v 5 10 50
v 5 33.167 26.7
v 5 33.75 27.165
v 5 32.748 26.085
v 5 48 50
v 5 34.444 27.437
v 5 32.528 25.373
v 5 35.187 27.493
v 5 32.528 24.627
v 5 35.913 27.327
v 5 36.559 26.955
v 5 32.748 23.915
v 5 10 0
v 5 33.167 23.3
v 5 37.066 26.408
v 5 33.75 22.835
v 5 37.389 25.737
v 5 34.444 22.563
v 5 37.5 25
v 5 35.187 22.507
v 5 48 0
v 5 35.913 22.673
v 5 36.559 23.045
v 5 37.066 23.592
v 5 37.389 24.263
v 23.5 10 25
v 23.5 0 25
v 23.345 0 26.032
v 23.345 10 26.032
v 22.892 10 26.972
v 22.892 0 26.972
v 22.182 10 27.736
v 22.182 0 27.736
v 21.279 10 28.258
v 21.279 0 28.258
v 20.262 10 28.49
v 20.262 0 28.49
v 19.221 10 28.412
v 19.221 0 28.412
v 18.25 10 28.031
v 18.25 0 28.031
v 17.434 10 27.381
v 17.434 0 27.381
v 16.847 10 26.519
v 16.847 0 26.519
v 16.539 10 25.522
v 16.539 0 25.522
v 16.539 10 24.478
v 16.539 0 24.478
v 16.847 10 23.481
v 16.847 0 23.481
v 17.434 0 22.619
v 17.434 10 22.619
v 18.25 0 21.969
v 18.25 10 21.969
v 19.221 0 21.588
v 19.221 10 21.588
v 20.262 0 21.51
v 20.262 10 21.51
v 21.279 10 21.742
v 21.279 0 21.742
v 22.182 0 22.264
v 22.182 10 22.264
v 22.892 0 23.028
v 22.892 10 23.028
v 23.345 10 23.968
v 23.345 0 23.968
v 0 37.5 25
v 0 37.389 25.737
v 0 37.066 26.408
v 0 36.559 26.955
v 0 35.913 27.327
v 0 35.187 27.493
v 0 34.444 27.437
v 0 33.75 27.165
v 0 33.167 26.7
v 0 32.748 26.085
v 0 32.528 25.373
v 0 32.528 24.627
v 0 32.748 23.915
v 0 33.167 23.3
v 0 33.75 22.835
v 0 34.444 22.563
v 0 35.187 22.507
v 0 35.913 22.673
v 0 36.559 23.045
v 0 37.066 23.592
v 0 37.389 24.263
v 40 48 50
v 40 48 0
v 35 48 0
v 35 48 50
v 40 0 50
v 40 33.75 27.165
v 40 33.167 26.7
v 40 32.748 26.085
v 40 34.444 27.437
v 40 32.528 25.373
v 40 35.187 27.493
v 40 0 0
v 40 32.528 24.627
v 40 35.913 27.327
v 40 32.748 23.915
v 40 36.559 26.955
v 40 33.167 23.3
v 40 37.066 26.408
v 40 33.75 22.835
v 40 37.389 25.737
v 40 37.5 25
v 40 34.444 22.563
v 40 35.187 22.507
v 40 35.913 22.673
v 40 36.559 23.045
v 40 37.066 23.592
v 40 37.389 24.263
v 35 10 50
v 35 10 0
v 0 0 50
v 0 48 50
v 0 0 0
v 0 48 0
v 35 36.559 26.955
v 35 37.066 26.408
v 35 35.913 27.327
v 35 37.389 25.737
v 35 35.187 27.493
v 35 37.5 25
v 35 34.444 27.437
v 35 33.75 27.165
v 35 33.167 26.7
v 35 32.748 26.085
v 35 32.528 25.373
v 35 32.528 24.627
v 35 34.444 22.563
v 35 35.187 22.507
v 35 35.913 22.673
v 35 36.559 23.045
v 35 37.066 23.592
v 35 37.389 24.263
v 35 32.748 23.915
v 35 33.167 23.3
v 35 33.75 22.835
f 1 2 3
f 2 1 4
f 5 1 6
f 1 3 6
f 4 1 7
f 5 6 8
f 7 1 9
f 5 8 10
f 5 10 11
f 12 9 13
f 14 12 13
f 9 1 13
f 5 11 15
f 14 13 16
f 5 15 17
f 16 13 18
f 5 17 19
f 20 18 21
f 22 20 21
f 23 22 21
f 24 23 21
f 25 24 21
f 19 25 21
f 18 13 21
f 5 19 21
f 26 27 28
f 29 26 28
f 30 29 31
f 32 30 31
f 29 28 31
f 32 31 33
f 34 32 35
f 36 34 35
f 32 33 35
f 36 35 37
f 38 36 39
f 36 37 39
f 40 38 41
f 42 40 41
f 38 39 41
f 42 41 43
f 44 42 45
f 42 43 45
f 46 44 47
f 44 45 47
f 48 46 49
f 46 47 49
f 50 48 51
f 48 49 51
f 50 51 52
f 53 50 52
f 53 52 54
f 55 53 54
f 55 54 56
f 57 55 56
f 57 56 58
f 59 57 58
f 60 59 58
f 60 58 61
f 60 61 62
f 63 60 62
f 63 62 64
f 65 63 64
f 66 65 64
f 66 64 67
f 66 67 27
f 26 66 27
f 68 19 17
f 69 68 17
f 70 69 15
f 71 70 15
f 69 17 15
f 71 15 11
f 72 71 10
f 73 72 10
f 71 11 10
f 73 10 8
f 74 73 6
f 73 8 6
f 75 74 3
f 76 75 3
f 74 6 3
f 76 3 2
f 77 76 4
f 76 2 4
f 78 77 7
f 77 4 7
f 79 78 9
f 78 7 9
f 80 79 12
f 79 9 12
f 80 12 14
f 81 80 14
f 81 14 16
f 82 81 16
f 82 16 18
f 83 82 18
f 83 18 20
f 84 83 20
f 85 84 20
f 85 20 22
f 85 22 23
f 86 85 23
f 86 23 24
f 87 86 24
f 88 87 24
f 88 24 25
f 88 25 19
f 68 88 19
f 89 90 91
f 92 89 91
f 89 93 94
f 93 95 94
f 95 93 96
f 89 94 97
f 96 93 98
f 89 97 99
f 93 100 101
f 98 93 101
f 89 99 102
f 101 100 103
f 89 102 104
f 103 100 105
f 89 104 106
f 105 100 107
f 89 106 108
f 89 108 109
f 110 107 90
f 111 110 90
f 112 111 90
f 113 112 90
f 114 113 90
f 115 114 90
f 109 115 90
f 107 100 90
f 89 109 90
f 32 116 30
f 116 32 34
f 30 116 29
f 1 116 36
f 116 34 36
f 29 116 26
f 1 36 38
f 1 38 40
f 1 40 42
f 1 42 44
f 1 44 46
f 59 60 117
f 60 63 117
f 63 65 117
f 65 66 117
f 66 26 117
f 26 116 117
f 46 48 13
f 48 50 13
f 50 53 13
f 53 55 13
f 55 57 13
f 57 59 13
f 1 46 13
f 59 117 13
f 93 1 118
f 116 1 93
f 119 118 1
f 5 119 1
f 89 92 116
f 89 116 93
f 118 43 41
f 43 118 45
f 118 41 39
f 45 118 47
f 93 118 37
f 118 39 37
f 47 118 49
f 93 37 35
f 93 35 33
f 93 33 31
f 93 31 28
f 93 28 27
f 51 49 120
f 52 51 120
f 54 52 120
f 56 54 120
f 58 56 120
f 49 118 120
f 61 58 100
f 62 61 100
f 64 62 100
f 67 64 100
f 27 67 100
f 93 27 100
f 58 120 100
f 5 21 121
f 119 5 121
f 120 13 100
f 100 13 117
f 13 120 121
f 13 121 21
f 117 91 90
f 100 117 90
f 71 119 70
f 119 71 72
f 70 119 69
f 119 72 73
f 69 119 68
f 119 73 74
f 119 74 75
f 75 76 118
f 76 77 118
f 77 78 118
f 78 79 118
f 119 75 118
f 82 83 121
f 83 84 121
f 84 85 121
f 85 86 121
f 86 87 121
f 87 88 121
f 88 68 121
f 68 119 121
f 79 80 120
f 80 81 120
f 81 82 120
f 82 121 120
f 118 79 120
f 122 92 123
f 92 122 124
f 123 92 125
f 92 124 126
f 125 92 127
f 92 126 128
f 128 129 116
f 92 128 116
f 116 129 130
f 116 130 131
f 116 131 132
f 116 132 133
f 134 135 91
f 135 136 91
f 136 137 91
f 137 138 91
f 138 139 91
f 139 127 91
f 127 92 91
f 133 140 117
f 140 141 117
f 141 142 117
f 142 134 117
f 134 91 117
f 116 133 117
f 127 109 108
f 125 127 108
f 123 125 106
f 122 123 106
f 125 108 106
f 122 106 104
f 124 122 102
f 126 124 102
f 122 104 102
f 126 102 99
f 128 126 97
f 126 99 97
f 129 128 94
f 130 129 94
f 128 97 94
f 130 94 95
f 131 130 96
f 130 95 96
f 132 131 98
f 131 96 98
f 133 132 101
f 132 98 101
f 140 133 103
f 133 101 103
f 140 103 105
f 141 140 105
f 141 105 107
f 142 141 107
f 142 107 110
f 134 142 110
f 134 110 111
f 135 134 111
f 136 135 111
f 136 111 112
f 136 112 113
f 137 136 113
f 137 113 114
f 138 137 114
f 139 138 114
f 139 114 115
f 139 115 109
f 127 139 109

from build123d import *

# Parameters (mm, degrees)
F1_DEPTH = 50
F2_R     = 3.5
F3_DEPTH = 25
F4_R     = 2.5
F5_DEPTH = 40.001


with BuildPart() as f1:
    # F0 (on Top) → F1 (new body)
    with BuildSketch(Plane.XY):
        Polygon((0, 48), (0, 0), (40, 0), (40, 48), (35, 48), (35, 10), (5, 10), (5, 48), align=None)
    extrude(amount=F1_DEPTH)

    # F2 (on face) → F3 (cut)
    with BuildSketch(Plane.XZ):
        with Locations((20, 25)):
            Circle(F2_R)
    extrude(amount=-F3_DEPTH, mode=Mode.SUBTRACT)

    # F4 (on face) → F5 (cut, through all)
    with BuildSketch(Plane.YZ.offset(40)):
        with Locations((35, 25)):
            Circle(F4_R)
    extrude(amount=-F5_DEPTH, mode=Mode.SUBTRACT)


solid = f1.part
